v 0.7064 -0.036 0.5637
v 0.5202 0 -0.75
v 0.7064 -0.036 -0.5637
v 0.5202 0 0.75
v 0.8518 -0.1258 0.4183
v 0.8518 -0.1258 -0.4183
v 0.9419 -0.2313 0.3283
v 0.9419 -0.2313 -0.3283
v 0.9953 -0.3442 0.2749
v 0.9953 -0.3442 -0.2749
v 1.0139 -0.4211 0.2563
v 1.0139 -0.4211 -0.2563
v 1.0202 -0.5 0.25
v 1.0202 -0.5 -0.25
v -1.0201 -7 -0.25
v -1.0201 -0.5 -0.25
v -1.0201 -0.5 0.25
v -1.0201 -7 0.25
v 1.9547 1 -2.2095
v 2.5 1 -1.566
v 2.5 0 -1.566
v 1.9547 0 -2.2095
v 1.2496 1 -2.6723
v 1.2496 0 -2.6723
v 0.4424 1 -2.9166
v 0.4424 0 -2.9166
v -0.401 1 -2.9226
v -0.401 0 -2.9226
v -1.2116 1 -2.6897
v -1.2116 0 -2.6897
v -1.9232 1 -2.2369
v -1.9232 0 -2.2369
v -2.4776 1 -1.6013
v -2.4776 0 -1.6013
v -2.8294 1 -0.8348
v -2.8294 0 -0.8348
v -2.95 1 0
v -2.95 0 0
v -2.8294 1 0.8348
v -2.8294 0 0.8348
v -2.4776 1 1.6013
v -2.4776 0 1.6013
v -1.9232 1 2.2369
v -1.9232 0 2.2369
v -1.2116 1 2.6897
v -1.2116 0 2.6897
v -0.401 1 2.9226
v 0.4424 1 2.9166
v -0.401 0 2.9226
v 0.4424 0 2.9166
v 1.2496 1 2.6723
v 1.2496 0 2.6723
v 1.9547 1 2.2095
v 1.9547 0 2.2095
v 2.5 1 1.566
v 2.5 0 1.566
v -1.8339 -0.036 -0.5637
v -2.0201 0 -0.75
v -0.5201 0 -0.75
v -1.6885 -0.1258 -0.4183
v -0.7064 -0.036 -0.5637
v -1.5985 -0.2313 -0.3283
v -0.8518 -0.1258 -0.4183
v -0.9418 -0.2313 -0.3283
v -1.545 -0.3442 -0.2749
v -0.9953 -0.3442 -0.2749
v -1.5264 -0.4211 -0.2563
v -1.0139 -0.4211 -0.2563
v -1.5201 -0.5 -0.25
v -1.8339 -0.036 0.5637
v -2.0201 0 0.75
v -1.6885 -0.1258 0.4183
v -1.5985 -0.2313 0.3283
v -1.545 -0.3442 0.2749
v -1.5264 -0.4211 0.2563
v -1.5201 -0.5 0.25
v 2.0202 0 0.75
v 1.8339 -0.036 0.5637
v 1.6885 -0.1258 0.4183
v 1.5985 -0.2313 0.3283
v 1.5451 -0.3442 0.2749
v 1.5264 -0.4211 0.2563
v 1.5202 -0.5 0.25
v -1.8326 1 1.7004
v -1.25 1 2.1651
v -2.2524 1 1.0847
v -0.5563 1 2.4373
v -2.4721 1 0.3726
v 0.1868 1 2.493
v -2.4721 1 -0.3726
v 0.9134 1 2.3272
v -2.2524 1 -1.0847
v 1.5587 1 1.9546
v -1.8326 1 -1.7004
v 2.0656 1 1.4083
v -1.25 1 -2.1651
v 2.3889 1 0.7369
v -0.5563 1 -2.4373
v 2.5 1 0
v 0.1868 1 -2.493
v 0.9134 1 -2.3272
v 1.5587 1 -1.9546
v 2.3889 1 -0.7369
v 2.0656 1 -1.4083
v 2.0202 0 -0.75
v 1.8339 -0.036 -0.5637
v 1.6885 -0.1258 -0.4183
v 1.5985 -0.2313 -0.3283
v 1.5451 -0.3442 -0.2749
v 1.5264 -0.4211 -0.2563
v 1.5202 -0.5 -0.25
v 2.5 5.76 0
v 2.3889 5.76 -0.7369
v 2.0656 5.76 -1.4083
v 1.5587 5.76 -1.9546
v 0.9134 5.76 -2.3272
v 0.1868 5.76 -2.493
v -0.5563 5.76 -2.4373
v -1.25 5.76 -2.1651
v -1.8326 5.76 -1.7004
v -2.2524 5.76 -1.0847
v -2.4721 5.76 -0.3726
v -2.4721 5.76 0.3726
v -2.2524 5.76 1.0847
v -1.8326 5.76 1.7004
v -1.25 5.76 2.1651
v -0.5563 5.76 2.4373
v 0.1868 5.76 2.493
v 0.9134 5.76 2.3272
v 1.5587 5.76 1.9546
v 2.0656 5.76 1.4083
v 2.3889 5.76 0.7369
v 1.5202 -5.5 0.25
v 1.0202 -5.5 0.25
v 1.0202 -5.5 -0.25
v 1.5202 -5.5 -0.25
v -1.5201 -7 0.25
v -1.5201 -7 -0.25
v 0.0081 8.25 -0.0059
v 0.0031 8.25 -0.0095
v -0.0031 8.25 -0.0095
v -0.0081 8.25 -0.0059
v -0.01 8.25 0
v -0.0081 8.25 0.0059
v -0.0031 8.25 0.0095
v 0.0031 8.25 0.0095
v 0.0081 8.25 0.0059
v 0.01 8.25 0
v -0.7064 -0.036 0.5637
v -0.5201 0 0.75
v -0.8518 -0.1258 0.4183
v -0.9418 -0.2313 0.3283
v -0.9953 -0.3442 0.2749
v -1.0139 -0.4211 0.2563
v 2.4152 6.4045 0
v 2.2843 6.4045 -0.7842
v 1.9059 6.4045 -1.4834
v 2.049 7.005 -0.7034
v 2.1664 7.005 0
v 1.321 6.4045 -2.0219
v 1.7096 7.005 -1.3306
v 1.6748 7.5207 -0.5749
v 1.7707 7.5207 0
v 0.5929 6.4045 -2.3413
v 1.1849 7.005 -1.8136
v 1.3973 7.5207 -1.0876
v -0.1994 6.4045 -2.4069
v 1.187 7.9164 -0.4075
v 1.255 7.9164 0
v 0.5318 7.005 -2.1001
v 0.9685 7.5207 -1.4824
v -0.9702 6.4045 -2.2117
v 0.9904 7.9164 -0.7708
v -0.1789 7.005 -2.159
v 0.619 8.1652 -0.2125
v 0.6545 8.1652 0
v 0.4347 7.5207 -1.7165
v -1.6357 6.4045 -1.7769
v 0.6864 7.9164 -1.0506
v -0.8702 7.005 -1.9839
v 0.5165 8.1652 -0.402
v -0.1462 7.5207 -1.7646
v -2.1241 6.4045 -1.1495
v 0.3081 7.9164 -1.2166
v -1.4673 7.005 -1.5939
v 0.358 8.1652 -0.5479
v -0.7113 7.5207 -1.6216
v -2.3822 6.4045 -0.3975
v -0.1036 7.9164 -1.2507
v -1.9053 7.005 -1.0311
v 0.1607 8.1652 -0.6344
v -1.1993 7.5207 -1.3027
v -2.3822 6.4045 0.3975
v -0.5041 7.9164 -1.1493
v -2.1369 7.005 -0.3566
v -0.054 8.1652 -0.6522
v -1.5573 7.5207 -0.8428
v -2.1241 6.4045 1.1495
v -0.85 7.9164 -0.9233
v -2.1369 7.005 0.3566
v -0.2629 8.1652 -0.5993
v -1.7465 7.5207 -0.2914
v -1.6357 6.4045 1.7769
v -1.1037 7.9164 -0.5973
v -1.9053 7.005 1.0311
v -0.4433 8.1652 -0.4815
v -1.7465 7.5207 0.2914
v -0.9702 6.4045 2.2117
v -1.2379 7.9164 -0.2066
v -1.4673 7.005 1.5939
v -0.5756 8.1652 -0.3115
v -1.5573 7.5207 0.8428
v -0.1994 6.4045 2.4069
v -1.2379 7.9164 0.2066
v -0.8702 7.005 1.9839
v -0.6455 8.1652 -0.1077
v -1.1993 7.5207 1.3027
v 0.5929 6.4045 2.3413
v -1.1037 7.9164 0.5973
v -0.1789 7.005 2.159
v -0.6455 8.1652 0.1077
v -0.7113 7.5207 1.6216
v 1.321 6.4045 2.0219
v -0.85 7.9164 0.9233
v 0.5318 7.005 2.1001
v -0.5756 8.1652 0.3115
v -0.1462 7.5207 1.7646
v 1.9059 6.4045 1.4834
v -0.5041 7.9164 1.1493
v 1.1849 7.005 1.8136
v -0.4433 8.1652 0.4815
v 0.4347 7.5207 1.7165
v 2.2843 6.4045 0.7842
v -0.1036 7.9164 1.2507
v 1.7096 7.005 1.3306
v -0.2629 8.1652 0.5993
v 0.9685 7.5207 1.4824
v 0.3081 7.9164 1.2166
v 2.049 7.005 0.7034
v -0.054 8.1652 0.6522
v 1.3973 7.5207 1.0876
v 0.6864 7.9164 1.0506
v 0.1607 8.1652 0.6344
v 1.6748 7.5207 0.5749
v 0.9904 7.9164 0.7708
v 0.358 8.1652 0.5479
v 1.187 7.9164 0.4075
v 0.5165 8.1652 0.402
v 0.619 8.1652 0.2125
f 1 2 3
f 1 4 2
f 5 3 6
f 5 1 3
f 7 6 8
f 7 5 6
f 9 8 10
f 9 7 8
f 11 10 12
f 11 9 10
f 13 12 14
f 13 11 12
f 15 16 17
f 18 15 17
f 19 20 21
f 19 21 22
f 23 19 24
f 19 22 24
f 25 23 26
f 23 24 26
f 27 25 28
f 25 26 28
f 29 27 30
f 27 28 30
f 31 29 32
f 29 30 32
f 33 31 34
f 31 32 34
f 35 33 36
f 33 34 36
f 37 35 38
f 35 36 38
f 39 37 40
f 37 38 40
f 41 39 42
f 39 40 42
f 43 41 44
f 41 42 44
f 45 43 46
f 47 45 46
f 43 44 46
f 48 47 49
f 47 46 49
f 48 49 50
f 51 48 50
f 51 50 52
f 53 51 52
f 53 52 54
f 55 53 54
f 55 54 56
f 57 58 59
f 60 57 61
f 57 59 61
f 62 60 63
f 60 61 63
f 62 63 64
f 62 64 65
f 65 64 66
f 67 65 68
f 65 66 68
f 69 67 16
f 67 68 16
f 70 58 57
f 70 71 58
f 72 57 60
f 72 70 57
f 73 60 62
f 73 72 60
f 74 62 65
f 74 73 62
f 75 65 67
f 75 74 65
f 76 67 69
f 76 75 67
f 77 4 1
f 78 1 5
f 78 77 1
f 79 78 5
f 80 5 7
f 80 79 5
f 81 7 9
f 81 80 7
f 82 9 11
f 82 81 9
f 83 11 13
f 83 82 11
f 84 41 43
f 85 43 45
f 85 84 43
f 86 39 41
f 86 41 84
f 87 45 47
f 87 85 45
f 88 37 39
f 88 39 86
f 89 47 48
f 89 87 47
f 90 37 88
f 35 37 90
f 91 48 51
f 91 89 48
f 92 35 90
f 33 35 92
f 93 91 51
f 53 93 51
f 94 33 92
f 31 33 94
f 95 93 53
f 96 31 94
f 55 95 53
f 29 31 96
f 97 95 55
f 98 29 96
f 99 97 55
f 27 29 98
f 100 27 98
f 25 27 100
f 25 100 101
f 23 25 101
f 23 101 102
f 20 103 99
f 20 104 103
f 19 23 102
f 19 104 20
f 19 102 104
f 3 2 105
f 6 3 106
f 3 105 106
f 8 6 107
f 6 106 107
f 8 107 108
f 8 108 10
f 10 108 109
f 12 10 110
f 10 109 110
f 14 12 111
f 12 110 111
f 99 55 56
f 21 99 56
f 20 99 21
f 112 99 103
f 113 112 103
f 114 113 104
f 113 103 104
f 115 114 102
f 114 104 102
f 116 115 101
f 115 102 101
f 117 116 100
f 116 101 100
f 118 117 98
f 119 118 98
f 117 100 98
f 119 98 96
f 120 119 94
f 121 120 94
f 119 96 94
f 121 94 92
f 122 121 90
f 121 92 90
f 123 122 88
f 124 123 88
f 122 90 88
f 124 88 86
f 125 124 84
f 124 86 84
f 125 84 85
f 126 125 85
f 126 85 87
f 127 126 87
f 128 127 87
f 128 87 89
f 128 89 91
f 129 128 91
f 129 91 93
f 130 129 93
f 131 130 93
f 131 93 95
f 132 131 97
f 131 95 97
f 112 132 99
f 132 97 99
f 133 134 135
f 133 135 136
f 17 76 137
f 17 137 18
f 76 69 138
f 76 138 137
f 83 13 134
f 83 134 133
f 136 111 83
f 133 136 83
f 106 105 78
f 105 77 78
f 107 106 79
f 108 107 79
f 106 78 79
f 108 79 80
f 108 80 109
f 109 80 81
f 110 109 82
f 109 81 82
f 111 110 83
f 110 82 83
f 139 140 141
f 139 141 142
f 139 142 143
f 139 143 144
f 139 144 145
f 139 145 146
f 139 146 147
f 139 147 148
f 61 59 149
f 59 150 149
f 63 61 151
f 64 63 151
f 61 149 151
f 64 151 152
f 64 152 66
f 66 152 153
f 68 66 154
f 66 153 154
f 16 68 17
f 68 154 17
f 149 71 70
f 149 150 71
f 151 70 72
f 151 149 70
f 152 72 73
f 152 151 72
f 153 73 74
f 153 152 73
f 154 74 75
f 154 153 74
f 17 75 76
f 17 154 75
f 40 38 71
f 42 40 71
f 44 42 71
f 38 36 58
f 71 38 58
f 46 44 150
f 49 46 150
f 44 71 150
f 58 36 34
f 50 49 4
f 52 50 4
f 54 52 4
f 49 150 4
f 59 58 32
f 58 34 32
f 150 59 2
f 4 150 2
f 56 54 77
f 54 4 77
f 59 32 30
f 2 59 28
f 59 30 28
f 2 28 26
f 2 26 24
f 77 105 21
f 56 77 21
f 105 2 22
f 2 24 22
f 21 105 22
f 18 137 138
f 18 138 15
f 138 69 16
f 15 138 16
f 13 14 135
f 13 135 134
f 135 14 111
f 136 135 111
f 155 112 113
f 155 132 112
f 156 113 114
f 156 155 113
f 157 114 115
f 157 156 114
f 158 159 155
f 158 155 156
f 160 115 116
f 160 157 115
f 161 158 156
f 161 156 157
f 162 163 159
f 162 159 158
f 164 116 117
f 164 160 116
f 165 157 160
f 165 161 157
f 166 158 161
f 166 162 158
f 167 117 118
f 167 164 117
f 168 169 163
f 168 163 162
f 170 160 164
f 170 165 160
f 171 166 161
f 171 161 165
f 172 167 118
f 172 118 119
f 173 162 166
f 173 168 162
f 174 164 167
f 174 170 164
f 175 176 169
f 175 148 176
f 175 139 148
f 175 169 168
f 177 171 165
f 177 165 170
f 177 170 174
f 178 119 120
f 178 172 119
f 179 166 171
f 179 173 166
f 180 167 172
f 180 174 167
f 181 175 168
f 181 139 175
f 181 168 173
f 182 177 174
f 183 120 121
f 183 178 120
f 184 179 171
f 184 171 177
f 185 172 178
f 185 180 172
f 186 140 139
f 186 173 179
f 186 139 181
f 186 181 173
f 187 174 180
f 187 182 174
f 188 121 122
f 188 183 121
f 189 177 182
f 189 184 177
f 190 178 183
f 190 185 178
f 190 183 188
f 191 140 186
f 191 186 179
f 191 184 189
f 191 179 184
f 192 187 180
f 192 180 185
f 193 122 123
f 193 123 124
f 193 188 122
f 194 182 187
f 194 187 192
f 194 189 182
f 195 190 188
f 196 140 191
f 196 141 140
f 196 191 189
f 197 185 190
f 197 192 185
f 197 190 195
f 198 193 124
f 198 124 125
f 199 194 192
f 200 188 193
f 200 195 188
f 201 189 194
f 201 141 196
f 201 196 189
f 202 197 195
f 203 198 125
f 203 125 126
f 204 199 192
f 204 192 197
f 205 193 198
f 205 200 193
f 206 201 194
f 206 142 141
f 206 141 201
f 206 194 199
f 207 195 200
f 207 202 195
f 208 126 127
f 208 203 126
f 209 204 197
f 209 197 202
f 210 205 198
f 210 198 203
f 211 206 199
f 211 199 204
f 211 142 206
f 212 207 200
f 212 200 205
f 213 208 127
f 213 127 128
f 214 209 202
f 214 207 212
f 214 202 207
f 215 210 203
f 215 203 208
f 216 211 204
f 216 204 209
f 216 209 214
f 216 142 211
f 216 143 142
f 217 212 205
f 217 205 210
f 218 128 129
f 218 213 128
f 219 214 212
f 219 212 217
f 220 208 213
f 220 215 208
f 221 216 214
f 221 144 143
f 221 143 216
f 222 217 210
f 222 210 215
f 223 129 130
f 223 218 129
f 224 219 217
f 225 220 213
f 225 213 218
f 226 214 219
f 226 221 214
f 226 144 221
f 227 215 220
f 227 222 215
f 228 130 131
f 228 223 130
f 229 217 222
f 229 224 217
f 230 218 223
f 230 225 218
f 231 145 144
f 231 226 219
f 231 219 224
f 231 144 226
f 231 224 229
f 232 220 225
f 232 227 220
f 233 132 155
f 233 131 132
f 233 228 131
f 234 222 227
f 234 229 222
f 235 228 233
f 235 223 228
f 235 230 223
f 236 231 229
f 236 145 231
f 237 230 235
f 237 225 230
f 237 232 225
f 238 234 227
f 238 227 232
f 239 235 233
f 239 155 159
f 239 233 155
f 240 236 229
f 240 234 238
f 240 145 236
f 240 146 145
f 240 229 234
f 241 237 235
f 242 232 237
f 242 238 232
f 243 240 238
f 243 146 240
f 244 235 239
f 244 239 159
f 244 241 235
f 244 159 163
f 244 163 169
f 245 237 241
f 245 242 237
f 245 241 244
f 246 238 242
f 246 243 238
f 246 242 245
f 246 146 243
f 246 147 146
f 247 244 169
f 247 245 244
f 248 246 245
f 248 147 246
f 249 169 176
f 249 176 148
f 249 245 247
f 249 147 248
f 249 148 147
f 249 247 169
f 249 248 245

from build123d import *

# Parameters (mm, degrees)
CROQUIS1_R           = 2.95
BASE_DEPTH           = 1
CROQUIS2_R           = 2.5
CUERPO_DEL_LED_DEPTH = 7.25
CROQUIS3_W           = 0.5
CROQUIS3_H           = 0.5
PINES_DEPTH          = 7
CROQUIS4_W           = 0.5
CROQUIS4_H           = 0.5
CORTE_A_CATODO_DEPTH = 1.5
REDONDEO_A_ANODO_R   = 0.5
REDONDEO_A_CATODO_R  = 0.5
CROQUIS6_W           = 1
CROQUIS6_H           = 6
RANURA_DEPTH         = 1
PUNTA_DEL_LED_R      = 2.49


with BuildPart() as part:
    # Croquis1 → Base (new body)
    with BuildSketch(Plane(origin=(0, 0, 0), x_dir=(1, 0, 0), z_dir=(0, 1, 0))):
        Circle(CROQUIS1_R)
    extrude(amount=BASE_DEPTH)

    # Croquis2 → Cuerpo del LED (add)
    with BuildSketch(Plane(origin=(0, 1, 0), x_dir=(1, 0, 0), z_dir=(0, 1, 0))):
        Circle(CROQUIS2_R)
    extrude(amount=CUERPO_DEL_LED_DEPTH)

    # Croquis3 → Pines (add)
    with BuildSketch(Plane.XZ):
        with Locations((-1.270142923, 0)):
            Rectangle(CROQUIS3_W, CROQUIS3_H)
        with Locations((1.270172723, 0)):
            Rectangle(CROQUIS3_W, CROQUIS3_H)
    extrude(amount=PINES_DEPTH)

    # Croquis4 → Corte a Catodo (cut)
    with BuildSketch(Plane.XZ.offset(7)):
        with Locations((1.270172723, 0)):
            Rectangle(CROQUIS4_W, CROQUIS4_H)
    extrude(amount=-CORTE_A_CATODO_DEPTH, mode=Mode.SUBTRACT)

    # Redondeo a Anodo
    redondeo_a_anodo_edges = [part.edges().sort_by_distance(p)[0] for p in [
        (-1.520142923, 0, 0),
        (-1.270142923, 0, -0.25),
        (-1.020142923, 0, 0),
        (-1.270142923, 0, 0.25),
    ]]
    fillet(redondeo_a_anodo_edges, radius=REDONDEO_A_ANODO_R)

    # Redondeo a Catodo
    redondeo_a_catodo_edges = [part.edges().sort_by_distance(p)[0] for p in [
        (1.020172723, 0, 0),
        (1.270172723, 0, -0.25),
        (1.520172723, 0, 0),
        (1.270172723, 0, 0.25),
    ]]
    fillet(redondeo_a_catodo_edges, radius=REDONDEO_A_CATODO_R)

    # Croquis6 → Ranura (cut)
    with BuildSketch(Plane(origin=(0, 1, 0), x_dir=(1, 0, 0), z_dir=(0, 1, 0))):
        with Locations((3, -0.26955261)):
            Rectangle(CROQUIS6_W, CROQUIS6_H)
    extrude(amount=-RANURA_DEPTH, mode=Mode.SUBTRACT)

    # Punta del Led
    punta_del_led_edges = [part.edges().sort_by_distance(p)[0] for p in [
        (-2.5, 8.25, 0),
    ]]
    fillet(punta_del_led_edges, radius=PUNTA_DEL_LED_R)


solid = part.part
